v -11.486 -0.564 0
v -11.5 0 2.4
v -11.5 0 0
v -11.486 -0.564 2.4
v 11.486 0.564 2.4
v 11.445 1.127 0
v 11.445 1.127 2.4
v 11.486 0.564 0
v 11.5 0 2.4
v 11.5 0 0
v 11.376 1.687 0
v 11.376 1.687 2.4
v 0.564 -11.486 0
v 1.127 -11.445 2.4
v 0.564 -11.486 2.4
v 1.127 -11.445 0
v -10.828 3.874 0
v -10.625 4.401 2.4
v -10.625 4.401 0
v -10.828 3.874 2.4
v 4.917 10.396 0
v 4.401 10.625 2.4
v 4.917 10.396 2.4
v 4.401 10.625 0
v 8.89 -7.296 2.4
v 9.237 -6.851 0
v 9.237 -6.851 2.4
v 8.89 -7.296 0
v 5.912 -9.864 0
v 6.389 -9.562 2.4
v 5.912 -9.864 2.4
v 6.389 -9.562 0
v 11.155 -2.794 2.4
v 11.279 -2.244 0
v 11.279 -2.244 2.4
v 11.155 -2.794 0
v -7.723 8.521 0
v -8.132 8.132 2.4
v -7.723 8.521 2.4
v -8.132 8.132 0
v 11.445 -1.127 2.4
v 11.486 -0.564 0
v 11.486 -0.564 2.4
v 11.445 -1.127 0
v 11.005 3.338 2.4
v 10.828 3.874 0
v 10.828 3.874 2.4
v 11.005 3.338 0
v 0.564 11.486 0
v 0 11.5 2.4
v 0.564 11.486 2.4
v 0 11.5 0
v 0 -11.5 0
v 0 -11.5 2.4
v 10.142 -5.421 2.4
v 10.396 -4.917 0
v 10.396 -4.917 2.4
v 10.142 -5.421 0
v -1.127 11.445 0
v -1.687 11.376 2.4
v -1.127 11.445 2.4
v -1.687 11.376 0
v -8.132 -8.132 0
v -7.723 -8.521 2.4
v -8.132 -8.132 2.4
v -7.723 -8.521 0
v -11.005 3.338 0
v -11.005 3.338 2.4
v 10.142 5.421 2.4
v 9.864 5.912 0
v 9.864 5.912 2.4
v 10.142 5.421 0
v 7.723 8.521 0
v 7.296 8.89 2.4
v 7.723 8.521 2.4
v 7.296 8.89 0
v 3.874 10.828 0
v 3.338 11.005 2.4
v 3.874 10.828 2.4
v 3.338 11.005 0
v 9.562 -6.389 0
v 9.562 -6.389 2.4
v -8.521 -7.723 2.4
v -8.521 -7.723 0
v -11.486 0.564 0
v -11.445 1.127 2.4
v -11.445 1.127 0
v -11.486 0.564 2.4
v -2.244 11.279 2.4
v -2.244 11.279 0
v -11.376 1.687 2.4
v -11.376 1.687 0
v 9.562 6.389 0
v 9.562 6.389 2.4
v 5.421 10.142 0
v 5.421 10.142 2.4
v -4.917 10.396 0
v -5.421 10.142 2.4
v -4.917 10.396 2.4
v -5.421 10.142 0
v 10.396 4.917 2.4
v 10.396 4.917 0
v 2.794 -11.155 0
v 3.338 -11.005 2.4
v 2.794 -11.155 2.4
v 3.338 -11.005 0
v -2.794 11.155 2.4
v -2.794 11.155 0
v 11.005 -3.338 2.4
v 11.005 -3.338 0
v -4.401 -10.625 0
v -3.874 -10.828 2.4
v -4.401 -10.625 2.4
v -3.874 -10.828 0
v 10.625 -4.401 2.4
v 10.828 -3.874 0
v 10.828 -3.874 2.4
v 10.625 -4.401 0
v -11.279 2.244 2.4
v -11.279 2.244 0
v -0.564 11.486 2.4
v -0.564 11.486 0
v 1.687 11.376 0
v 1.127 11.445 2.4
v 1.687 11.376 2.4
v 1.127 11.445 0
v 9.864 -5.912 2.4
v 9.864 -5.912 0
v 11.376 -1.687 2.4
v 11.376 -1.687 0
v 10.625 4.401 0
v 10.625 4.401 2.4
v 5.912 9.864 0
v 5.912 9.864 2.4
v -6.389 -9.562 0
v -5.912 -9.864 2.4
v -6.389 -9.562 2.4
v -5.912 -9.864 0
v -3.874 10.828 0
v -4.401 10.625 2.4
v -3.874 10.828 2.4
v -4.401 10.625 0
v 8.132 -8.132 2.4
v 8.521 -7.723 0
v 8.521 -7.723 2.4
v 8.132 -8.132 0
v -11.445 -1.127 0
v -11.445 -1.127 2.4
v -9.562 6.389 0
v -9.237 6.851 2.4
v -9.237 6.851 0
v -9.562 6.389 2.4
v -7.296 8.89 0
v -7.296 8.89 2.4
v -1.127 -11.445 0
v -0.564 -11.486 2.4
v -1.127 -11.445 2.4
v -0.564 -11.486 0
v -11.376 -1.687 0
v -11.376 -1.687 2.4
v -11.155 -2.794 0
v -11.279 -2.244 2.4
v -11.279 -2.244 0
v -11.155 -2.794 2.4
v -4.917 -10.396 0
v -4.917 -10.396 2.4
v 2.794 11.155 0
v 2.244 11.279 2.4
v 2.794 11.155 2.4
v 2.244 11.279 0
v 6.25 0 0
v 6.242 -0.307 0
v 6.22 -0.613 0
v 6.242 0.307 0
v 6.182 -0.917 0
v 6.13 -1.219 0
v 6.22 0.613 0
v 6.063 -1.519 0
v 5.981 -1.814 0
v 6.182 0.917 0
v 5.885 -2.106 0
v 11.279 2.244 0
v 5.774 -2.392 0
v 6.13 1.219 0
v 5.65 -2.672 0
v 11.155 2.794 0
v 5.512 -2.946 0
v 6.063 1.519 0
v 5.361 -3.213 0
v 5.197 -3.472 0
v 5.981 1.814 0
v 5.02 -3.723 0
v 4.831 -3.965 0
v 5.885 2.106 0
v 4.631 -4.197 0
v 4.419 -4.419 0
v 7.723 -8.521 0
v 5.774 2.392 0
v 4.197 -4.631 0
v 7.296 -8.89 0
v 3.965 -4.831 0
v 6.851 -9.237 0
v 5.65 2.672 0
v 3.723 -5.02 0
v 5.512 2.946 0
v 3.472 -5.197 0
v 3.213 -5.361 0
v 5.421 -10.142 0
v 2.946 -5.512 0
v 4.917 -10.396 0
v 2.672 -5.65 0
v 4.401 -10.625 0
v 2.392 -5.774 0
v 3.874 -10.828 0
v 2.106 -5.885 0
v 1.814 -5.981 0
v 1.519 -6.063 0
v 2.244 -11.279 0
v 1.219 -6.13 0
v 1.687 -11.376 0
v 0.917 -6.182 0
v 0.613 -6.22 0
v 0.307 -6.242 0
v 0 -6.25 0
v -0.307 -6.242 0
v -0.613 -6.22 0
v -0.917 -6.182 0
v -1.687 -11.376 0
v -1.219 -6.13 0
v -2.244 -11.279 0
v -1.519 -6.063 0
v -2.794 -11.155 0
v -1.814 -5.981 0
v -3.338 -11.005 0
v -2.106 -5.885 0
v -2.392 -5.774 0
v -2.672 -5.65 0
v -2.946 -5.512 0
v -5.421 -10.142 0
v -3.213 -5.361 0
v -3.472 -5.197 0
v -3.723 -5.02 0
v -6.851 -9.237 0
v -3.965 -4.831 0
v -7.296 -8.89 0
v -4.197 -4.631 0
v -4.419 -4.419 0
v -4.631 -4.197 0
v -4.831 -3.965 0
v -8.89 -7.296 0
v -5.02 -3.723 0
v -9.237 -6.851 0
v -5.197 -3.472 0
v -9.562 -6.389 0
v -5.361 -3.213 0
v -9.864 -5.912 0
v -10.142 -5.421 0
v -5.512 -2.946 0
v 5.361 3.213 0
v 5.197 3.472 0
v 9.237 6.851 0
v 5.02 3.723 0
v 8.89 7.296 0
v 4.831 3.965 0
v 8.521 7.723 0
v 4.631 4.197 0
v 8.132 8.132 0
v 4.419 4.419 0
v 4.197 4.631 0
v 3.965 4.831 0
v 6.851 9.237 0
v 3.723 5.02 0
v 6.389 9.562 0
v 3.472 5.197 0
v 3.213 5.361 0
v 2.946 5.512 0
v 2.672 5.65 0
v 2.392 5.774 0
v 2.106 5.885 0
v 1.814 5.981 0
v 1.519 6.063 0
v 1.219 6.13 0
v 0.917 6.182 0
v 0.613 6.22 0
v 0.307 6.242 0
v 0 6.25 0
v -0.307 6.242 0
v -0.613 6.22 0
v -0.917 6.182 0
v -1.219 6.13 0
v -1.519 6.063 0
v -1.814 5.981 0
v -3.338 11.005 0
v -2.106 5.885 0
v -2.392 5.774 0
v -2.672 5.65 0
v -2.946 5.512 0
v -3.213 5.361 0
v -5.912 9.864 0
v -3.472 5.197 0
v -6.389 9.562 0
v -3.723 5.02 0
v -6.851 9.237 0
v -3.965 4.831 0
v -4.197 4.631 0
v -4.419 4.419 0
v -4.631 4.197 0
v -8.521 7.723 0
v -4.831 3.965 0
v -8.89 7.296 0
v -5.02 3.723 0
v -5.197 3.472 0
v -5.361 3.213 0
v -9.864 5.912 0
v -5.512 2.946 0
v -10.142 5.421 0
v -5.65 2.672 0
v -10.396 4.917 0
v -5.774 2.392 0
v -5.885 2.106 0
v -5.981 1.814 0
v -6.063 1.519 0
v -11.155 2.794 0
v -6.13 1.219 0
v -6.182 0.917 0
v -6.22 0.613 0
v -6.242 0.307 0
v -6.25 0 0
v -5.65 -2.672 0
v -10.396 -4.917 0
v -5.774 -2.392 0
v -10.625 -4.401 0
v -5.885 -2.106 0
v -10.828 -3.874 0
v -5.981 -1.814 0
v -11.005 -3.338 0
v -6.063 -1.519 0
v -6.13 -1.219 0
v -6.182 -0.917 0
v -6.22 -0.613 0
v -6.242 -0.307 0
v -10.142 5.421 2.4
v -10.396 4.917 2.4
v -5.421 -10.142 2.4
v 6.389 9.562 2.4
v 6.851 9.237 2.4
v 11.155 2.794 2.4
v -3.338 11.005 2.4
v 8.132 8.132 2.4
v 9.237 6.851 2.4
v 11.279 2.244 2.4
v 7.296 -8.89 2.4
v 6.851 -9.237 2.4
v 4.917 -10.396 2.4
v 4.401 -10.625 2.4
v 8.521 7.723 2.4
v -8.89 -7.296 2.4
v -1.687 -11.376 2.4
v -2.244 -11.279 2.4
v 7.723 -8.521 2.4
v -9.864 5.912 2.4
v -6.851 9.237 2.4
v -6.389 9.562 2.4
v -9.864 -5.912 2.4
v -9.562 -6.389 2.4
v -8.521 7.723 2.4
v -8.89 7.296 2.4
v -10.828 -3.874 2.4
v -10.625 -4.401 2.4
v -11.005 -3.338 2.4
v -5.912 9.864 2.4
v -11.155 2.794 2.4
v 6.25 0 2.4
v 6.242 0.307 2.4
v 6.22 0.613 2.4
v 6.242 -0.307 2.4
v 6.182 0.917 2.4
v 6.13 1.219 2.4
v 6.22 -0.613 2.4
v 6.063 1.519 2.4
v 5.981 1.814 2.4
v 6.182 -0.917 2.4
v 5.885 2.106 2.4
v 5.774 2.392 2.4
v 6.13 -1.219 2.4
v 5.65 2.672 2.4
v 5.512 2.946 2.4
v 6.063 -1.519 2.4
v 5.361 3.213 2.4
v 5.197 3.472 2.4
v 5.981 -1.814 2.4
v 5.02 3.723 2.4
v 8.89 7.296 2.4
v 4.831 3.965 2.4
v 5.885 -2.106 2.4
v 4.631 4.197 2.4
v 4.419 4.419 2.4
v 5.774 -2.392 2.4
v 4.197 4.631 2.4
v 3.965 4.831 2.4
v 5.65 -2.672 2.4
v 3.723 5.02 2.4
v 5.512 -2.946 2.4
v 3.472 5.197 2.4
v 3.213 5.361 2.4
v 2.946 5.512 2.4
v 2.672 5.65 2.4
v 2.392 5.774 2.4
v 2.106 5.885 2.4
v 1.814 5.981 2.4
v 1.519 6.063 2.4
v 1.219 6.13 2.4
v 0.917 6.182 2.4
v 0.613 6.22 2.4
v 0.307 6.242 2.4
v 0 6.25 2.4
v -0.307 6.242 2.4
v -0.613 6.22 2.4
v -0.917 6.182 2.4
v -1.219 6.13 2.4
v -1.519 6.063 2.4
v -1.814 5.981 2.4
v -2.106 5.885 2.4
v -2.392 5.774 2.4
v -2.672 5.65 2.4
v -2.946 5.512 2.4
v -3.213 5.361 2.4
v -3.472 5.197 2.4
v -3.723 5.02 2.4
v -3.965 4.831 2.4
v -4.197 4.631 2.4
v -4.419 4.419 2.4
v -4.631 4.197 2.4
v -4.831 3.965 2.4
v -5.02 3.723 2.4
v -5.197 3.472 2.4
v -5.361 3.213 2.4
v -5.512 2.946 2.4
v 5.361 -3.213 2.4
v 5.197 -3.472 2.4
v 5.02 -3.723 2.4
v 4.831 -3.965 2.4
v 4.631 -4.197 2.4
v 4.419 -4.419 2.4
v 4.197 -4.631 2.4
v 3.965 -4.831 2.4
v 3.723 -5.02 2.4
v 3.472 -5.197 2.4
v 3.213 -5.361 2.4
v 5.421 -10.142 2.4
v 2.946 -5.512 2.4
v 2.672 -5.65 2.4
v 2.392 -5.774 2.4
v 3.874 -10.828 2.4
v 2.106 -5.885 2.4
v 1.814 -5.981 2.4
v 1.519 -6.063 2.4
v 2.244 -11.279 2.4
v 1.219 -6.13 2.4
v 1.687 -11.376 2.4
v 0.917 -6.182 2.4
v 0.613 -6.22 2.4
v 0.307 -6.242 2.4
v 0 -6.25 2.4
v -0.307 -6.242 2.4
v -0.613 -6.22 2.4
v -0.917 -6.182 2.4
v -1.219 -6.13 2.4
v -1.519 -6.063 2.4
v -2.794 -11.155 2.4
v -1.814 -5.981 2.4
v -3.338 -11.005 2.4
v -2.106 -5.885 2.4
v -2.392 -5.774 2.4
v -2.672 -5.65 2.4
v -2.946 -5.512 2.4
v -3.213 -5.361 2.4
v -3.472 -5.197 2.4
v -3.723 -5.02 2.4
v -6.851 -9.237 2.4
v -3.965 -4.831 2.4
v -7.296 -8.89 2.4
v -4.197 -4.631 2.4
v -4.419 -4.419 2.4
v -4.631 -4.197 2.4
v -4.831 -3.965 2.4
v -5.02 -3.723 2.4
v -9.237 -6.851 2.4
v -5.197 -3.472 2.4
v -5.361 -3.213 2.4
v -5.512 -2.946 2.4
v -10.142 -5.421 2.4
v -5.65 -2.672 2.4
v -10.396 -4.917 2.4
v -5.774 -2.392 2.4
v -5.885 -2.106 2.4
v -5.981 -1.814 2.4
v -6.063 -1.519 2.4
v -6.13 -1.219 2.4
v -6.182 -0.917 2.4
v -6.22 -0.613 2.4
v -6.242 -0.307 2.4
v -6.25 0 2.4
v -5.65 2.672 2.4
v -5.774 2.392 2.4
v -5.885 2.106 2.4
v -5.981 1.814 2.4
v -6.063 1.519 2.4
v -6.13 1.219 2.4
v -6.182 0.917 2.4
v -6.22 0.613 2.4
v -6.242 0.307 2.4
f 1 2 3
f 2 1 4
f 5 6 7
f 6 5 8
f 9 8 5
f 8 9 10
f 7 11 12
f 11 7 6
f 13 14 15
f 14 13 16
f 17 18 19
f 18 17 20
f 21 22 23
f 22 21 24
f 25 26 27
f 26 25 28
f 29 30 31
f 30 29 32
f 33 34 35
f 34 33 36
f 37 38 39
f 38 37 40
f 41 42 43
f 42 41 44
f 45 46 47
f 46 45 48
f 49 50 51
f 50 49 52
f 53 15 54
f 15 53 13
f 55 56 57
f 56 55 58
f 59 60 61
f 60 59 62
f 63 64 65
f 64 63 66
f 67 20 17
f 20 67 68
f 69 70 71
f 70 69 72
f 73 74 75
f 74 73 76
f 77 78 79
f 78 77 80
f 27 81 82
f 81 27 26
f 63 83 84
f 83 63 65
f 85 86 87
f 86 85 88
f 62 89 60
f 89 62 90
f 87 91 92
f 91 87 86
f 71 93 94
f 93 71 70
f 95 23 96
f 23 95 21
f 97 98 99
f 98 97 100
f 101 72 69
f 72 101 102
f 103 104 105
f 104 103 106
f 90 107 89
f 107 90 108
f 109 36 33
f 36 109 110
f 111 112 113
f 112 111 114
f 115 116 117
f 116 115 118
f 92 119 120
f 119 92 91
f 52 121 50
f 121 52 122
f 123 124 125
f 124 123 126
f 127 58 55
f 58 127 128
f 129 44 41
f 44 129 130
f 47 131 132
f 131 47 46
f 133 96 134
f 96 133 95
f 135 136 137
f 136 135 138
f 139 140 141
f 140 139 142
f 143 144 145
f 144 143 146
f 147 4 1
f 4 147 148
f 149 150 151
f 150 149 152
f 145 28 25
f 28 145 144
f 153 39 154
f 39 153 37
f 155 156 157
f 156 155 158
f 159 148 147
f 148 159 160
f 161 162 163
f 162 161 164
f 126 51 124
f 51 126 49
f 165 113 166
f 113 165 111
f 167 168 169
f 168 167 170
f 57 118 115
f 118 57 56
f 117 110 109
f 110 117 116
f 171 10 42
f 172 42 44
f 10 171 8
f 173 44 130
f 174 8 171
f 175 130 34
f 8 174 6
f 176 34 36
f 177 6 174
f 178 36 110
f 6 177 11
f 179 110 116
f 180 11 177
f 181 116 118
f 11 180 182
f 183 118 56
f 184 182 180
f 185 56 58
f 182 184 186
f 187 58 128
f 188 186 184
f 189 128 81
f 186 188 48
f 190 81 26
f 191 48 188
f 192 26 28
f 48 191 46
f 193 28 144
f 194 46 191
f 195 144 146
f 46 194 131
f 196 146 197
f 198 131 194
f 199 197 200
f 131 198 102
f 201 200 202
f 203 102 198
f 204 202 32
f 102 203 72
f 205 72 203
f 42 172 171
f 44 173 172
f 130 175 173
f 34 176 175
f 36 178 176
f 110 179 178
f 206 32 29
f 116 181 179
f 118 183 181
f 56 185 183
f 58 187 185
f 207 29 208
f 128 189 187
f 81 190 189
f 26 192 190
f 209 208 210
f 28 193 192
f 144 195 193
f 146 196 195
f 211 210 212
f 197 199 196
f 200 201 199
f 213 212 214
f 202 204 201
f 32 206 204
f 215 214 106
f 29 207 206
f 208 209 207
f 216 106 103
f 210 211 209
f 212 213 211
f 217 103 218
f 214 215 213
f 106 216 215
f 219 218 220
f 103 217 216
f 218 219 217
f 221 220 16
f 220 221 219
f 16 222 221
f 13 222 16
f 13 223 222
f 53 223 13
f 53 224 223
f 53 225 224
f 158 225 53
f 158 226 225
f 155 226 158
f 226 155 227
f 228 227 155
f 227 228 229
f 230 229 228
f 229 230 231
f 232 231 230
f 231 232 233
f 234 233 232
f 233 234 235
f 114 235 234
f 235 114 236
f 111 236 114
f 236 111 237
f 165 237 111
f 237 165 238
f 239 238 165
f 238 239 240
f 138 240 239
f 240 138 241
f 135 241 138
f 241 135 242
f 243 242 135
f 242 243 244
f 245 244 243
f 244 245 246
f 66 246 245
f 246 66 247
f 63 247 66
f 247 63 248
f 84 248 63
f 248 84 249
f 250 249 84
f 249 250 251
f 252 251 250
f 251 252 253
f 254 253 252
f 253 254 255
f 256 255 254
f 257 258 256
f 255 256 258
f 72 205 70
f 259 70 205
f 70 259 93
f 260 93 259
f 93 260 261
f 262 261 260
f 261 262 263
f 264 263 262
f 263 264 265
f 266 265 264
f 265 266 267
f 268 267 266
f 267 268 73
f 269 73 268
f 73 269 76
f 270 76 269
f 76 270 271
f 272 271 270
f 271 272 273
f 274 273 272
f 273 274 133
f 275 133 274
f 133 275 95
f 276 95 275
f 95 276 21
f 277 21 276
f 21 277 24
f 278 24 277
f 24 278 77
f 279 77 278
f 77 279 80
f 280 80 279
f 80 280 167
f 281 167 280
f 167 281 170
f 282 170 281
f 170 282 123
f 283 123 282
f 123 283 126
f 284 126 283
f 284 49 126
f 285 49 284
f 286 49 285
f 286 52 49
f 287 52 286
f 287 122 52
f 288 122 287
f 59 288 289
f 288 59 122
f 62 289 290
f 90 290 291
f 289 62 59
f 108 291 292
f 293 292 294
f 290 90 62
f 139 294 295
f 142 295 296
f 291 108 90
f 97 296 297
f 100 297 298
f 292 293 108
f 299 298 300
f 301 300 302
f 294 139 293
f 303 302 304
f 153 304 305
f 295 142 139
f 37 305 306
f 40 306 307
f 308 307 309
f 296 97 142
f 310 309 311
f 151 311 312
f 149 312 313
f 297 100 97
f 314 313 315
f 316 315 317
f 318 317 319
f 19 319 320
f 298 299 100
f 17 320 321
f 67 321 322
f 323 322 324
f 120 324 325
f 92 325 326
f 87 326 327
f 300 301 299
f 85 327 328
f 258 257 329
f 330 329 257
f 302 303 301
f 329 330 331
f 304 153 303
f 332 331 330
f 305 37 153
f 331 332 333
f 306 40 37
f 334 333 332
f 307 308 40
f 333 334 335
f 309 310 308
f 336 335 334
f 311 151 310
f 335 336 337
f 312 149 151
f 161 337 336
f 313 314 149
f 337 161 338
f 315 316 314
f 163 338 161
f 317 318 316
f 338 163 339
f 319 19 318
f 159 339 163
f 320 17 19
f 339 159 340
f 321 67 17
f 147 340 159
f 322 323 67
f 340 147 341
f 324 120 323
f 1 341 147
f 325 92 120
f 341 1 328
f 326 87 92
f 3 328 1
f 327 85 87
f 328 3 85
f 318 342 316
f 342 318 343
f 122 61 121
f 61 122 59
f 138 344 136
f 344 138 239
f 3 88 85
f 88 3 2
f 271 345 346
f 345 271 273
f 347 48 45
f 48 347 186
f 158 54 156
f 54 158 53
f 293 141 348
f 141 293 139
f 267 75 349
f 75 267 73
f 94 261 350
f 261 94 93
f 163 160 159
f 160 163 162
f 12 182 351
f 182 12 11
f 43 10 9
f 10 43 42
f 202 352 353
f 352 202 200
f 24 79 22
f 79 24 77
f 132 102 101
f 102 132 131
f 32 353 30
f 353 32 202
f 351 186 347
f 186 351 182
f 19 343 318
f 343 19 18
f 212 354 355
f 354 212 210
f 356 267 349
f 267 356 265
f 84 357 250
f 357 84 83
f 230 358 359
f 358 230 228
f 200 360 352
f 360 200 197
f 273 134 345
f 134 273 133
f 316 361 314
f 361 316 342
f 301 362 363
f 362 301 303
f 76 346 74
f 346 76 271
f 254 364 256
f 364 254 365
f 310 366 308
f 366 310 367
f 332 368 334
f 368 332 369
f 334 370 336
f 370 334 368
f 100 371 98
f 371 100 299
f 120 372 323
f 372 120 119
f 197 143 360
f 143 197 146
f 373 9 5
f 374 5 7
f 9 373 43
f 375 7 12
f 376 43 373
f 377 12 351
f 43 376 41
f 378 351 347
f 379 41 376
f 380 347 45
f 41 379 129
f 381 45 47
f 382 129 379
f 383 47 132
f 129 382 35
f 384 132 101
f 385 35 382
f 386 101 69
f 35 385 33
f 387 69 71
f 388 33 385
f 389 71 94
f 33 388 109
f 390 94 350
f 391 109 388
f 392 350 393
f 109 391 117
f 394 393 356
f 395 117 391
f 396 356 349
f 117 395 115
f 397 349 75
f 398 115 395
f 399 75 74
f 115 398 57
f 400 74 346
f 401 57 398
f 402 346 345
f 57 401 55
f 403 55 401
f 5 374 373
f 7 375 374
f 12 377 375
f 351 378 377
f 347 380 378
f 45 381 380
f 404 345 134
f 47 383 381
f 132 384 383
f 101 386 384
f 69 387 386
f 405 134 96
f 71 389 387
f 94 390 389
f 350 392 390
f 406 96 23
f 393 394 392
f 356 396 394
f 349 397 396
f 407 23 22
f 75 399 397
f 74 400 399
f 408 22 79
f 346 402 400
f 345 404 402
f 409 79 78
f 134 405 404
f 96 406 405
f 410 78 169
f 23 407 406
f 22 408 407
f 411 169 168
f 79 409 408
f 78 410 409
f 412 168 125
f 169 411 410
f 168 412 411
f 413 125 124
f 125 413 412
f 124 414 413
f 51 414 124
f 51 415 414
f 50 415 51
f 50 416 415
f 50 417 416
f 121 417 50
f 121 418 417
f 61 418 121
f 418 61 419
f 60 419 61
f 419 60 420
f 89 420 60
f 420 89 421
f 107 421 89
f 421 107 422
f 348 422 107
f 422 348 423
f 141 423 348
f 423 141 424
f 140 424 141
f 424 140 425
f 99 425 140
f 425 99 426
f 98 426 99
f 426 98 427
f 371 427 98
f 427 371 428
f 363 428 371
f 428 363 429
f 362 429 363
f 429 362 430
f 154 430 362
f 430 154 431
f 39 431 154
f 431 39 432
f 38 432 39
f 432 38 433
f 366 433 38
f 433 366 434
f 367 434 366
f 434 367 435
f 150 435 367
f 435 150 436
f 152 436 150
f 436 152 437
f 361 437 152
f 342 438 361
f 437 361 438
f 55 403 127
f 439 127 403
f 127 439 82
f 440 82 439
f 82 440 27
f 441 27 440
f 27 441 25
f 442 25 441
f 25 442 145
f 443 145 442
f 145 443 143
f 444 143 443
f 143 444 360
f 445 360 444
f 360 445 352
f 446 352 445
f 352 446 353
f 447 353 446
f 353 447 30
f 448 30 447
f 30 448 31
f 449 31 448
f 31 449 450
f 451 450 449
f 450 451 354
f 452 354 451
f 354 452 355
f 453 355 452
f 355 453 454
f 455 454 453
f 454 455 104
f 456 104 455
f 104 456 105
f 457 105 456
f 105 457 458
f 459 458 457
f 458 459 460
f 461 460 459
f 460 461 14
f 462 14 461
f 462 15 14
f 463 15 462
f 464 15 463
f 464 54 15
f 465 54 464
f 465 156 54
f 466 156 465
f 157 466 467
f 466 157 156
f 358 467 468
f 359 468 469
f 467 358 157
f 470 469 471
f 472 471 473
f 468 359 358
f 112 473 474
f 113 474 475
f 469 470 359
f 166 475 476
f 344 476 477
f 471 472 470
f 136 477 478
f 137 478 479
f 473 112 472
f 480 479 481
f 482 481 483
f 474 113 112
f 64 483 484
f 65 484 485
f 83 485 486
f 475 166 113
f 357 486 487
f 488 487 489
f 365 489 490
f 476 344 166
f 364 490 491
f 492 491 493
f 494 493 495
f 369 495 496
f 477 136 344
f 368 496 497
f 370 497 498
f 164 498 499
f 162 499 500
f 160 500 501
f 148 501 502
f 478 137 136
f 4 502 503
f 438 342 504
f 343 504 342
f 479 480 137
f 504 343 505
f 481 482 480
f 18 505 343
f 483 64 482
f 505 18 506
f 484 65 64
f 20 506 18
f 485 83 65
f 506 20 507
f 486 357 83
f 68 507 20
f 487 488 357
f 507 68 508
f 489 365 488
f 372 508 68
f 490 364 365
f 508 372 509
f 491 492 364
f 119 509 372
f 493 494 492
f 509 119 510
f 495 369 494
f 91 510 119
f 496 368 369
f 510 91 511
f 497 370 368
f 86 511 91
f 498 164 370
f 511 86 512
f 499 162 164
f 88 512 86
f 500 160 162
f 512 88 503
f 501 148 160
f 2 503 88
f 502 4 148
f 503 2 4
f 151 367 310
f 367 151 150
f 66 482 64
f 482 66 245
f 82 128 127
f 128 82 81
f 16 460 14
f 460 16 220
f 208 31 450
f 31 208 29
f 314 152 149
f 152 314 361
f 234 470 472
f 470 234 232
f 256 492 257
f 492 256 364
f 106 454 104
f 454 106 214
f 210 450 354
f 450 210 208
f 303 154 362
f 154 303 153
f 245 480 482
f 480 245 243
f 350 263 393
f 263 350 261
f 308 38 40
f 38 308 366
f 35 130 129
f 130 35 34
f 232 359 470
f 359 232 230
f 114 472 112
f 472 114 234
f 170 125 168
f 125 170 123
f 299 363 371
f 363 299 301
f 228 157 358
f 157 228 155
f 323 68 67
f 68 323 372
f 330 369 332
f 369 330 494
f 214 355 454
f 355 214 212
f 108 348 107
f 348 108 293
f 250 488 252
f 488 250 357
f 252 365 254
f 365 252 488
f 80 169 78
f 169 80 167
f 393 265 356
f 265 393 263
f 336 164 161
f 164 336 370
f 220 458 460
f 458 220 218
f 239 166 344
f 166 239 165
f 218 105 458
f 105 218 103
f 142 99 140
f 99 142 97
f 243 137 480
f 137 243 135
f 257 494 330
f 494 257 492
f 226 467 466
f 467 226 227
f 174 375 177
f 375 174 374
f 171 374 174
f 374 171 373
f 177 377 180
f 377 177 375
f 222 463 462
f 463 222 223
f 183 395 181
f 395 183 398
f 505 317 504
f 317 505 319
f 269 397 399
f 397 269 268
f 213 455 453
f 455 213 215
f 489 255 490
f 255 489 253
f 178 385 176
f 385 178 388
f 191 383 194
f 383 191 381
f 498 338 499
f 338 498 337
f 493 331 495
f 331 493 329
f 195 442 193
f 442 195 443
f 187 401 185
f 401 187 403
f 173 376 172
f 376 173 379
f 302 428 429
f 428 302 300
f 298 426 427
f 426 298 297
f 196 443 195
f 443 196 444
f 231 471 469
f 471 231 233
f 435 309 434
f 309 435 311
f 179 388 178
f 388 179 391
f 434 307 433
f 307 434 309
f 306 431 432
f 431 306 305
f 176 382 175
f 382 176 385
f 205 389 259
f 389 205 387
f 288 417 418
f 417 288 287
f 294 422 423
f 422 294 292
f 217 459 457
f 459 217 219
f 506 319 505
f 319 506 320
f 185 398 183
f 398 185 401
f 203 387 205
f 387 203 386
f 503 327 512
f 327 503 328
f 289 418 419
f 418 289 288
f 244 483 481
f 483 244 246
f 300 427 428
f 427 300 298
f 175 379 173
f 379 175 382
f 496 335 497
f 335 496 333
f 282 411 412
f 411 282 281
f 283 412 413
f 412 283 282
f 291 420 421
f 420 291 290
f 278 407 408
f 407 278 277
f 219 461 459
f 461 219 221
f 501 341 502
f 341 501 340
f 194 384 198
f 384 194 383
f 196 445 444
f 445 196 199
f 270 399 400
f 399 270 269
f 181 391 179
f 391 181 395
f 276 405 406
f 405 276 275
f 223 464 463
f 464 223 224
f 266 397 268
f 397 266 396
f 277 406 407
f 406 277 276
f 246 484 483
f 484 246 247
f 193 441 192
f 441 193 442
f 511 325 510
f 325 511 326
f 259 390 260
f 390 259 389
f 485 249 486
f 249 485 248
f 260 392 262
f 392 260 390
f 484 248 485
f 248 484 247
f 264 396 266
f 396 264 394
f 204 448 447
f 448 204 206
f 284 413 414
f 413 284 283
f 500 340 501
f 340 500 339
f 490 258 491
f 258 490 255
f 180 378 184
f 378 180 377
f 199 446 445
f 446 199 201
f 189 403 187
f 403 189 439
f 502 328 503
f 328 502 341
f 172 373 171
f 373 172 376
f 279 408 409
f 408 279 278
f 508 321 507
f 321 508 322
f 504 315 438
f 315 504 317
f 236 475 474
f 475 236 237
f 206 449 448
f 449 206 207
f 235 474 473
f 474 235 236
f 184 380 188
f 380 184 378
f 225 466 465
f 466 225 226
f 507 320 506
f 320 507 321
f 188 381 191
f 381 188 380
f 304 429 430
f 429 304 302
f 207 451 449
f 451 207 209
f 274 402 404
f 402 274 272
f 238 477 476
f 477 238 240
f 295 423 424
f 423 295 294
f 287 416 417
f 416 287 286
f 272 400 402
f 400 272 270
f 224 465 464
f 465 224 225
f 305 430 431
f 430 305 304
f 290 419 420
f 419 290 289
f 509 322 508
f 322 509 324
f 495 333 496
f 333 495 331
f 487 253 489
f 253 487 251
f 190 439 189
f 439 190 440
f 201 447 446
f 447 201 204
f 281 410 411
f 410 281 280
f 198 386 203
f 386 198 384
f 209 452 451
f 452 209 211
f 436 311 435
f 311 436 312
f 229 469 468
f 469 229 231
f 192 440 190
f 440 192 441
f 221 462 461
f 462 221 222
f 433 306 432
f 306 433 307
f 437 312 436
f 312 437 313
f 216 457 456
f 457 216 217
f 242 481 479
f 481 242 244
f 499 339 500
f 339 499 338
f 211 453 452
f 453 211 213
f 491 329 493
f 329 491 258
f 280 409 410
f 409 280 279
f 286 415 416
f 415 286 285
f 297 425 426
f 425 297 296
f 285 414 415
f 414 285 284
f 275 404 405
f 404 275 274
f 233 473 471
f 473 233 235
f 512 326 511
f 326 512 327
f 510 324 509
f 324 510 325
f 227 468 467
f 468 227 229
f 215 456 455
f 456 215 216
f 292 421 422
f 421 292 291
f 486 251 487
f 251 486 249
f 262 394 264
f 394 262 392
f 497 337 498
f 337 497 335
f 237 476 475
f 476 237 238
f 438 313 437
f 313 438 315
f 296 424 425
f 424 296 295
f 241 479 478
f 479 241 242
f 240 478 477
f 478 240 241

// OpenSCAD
$fn=128;

difference() {
	cylinder(2.4,11.5,11.5);
	translate([0,0,-1]) cylinder(5,6.25,6.25);
}
